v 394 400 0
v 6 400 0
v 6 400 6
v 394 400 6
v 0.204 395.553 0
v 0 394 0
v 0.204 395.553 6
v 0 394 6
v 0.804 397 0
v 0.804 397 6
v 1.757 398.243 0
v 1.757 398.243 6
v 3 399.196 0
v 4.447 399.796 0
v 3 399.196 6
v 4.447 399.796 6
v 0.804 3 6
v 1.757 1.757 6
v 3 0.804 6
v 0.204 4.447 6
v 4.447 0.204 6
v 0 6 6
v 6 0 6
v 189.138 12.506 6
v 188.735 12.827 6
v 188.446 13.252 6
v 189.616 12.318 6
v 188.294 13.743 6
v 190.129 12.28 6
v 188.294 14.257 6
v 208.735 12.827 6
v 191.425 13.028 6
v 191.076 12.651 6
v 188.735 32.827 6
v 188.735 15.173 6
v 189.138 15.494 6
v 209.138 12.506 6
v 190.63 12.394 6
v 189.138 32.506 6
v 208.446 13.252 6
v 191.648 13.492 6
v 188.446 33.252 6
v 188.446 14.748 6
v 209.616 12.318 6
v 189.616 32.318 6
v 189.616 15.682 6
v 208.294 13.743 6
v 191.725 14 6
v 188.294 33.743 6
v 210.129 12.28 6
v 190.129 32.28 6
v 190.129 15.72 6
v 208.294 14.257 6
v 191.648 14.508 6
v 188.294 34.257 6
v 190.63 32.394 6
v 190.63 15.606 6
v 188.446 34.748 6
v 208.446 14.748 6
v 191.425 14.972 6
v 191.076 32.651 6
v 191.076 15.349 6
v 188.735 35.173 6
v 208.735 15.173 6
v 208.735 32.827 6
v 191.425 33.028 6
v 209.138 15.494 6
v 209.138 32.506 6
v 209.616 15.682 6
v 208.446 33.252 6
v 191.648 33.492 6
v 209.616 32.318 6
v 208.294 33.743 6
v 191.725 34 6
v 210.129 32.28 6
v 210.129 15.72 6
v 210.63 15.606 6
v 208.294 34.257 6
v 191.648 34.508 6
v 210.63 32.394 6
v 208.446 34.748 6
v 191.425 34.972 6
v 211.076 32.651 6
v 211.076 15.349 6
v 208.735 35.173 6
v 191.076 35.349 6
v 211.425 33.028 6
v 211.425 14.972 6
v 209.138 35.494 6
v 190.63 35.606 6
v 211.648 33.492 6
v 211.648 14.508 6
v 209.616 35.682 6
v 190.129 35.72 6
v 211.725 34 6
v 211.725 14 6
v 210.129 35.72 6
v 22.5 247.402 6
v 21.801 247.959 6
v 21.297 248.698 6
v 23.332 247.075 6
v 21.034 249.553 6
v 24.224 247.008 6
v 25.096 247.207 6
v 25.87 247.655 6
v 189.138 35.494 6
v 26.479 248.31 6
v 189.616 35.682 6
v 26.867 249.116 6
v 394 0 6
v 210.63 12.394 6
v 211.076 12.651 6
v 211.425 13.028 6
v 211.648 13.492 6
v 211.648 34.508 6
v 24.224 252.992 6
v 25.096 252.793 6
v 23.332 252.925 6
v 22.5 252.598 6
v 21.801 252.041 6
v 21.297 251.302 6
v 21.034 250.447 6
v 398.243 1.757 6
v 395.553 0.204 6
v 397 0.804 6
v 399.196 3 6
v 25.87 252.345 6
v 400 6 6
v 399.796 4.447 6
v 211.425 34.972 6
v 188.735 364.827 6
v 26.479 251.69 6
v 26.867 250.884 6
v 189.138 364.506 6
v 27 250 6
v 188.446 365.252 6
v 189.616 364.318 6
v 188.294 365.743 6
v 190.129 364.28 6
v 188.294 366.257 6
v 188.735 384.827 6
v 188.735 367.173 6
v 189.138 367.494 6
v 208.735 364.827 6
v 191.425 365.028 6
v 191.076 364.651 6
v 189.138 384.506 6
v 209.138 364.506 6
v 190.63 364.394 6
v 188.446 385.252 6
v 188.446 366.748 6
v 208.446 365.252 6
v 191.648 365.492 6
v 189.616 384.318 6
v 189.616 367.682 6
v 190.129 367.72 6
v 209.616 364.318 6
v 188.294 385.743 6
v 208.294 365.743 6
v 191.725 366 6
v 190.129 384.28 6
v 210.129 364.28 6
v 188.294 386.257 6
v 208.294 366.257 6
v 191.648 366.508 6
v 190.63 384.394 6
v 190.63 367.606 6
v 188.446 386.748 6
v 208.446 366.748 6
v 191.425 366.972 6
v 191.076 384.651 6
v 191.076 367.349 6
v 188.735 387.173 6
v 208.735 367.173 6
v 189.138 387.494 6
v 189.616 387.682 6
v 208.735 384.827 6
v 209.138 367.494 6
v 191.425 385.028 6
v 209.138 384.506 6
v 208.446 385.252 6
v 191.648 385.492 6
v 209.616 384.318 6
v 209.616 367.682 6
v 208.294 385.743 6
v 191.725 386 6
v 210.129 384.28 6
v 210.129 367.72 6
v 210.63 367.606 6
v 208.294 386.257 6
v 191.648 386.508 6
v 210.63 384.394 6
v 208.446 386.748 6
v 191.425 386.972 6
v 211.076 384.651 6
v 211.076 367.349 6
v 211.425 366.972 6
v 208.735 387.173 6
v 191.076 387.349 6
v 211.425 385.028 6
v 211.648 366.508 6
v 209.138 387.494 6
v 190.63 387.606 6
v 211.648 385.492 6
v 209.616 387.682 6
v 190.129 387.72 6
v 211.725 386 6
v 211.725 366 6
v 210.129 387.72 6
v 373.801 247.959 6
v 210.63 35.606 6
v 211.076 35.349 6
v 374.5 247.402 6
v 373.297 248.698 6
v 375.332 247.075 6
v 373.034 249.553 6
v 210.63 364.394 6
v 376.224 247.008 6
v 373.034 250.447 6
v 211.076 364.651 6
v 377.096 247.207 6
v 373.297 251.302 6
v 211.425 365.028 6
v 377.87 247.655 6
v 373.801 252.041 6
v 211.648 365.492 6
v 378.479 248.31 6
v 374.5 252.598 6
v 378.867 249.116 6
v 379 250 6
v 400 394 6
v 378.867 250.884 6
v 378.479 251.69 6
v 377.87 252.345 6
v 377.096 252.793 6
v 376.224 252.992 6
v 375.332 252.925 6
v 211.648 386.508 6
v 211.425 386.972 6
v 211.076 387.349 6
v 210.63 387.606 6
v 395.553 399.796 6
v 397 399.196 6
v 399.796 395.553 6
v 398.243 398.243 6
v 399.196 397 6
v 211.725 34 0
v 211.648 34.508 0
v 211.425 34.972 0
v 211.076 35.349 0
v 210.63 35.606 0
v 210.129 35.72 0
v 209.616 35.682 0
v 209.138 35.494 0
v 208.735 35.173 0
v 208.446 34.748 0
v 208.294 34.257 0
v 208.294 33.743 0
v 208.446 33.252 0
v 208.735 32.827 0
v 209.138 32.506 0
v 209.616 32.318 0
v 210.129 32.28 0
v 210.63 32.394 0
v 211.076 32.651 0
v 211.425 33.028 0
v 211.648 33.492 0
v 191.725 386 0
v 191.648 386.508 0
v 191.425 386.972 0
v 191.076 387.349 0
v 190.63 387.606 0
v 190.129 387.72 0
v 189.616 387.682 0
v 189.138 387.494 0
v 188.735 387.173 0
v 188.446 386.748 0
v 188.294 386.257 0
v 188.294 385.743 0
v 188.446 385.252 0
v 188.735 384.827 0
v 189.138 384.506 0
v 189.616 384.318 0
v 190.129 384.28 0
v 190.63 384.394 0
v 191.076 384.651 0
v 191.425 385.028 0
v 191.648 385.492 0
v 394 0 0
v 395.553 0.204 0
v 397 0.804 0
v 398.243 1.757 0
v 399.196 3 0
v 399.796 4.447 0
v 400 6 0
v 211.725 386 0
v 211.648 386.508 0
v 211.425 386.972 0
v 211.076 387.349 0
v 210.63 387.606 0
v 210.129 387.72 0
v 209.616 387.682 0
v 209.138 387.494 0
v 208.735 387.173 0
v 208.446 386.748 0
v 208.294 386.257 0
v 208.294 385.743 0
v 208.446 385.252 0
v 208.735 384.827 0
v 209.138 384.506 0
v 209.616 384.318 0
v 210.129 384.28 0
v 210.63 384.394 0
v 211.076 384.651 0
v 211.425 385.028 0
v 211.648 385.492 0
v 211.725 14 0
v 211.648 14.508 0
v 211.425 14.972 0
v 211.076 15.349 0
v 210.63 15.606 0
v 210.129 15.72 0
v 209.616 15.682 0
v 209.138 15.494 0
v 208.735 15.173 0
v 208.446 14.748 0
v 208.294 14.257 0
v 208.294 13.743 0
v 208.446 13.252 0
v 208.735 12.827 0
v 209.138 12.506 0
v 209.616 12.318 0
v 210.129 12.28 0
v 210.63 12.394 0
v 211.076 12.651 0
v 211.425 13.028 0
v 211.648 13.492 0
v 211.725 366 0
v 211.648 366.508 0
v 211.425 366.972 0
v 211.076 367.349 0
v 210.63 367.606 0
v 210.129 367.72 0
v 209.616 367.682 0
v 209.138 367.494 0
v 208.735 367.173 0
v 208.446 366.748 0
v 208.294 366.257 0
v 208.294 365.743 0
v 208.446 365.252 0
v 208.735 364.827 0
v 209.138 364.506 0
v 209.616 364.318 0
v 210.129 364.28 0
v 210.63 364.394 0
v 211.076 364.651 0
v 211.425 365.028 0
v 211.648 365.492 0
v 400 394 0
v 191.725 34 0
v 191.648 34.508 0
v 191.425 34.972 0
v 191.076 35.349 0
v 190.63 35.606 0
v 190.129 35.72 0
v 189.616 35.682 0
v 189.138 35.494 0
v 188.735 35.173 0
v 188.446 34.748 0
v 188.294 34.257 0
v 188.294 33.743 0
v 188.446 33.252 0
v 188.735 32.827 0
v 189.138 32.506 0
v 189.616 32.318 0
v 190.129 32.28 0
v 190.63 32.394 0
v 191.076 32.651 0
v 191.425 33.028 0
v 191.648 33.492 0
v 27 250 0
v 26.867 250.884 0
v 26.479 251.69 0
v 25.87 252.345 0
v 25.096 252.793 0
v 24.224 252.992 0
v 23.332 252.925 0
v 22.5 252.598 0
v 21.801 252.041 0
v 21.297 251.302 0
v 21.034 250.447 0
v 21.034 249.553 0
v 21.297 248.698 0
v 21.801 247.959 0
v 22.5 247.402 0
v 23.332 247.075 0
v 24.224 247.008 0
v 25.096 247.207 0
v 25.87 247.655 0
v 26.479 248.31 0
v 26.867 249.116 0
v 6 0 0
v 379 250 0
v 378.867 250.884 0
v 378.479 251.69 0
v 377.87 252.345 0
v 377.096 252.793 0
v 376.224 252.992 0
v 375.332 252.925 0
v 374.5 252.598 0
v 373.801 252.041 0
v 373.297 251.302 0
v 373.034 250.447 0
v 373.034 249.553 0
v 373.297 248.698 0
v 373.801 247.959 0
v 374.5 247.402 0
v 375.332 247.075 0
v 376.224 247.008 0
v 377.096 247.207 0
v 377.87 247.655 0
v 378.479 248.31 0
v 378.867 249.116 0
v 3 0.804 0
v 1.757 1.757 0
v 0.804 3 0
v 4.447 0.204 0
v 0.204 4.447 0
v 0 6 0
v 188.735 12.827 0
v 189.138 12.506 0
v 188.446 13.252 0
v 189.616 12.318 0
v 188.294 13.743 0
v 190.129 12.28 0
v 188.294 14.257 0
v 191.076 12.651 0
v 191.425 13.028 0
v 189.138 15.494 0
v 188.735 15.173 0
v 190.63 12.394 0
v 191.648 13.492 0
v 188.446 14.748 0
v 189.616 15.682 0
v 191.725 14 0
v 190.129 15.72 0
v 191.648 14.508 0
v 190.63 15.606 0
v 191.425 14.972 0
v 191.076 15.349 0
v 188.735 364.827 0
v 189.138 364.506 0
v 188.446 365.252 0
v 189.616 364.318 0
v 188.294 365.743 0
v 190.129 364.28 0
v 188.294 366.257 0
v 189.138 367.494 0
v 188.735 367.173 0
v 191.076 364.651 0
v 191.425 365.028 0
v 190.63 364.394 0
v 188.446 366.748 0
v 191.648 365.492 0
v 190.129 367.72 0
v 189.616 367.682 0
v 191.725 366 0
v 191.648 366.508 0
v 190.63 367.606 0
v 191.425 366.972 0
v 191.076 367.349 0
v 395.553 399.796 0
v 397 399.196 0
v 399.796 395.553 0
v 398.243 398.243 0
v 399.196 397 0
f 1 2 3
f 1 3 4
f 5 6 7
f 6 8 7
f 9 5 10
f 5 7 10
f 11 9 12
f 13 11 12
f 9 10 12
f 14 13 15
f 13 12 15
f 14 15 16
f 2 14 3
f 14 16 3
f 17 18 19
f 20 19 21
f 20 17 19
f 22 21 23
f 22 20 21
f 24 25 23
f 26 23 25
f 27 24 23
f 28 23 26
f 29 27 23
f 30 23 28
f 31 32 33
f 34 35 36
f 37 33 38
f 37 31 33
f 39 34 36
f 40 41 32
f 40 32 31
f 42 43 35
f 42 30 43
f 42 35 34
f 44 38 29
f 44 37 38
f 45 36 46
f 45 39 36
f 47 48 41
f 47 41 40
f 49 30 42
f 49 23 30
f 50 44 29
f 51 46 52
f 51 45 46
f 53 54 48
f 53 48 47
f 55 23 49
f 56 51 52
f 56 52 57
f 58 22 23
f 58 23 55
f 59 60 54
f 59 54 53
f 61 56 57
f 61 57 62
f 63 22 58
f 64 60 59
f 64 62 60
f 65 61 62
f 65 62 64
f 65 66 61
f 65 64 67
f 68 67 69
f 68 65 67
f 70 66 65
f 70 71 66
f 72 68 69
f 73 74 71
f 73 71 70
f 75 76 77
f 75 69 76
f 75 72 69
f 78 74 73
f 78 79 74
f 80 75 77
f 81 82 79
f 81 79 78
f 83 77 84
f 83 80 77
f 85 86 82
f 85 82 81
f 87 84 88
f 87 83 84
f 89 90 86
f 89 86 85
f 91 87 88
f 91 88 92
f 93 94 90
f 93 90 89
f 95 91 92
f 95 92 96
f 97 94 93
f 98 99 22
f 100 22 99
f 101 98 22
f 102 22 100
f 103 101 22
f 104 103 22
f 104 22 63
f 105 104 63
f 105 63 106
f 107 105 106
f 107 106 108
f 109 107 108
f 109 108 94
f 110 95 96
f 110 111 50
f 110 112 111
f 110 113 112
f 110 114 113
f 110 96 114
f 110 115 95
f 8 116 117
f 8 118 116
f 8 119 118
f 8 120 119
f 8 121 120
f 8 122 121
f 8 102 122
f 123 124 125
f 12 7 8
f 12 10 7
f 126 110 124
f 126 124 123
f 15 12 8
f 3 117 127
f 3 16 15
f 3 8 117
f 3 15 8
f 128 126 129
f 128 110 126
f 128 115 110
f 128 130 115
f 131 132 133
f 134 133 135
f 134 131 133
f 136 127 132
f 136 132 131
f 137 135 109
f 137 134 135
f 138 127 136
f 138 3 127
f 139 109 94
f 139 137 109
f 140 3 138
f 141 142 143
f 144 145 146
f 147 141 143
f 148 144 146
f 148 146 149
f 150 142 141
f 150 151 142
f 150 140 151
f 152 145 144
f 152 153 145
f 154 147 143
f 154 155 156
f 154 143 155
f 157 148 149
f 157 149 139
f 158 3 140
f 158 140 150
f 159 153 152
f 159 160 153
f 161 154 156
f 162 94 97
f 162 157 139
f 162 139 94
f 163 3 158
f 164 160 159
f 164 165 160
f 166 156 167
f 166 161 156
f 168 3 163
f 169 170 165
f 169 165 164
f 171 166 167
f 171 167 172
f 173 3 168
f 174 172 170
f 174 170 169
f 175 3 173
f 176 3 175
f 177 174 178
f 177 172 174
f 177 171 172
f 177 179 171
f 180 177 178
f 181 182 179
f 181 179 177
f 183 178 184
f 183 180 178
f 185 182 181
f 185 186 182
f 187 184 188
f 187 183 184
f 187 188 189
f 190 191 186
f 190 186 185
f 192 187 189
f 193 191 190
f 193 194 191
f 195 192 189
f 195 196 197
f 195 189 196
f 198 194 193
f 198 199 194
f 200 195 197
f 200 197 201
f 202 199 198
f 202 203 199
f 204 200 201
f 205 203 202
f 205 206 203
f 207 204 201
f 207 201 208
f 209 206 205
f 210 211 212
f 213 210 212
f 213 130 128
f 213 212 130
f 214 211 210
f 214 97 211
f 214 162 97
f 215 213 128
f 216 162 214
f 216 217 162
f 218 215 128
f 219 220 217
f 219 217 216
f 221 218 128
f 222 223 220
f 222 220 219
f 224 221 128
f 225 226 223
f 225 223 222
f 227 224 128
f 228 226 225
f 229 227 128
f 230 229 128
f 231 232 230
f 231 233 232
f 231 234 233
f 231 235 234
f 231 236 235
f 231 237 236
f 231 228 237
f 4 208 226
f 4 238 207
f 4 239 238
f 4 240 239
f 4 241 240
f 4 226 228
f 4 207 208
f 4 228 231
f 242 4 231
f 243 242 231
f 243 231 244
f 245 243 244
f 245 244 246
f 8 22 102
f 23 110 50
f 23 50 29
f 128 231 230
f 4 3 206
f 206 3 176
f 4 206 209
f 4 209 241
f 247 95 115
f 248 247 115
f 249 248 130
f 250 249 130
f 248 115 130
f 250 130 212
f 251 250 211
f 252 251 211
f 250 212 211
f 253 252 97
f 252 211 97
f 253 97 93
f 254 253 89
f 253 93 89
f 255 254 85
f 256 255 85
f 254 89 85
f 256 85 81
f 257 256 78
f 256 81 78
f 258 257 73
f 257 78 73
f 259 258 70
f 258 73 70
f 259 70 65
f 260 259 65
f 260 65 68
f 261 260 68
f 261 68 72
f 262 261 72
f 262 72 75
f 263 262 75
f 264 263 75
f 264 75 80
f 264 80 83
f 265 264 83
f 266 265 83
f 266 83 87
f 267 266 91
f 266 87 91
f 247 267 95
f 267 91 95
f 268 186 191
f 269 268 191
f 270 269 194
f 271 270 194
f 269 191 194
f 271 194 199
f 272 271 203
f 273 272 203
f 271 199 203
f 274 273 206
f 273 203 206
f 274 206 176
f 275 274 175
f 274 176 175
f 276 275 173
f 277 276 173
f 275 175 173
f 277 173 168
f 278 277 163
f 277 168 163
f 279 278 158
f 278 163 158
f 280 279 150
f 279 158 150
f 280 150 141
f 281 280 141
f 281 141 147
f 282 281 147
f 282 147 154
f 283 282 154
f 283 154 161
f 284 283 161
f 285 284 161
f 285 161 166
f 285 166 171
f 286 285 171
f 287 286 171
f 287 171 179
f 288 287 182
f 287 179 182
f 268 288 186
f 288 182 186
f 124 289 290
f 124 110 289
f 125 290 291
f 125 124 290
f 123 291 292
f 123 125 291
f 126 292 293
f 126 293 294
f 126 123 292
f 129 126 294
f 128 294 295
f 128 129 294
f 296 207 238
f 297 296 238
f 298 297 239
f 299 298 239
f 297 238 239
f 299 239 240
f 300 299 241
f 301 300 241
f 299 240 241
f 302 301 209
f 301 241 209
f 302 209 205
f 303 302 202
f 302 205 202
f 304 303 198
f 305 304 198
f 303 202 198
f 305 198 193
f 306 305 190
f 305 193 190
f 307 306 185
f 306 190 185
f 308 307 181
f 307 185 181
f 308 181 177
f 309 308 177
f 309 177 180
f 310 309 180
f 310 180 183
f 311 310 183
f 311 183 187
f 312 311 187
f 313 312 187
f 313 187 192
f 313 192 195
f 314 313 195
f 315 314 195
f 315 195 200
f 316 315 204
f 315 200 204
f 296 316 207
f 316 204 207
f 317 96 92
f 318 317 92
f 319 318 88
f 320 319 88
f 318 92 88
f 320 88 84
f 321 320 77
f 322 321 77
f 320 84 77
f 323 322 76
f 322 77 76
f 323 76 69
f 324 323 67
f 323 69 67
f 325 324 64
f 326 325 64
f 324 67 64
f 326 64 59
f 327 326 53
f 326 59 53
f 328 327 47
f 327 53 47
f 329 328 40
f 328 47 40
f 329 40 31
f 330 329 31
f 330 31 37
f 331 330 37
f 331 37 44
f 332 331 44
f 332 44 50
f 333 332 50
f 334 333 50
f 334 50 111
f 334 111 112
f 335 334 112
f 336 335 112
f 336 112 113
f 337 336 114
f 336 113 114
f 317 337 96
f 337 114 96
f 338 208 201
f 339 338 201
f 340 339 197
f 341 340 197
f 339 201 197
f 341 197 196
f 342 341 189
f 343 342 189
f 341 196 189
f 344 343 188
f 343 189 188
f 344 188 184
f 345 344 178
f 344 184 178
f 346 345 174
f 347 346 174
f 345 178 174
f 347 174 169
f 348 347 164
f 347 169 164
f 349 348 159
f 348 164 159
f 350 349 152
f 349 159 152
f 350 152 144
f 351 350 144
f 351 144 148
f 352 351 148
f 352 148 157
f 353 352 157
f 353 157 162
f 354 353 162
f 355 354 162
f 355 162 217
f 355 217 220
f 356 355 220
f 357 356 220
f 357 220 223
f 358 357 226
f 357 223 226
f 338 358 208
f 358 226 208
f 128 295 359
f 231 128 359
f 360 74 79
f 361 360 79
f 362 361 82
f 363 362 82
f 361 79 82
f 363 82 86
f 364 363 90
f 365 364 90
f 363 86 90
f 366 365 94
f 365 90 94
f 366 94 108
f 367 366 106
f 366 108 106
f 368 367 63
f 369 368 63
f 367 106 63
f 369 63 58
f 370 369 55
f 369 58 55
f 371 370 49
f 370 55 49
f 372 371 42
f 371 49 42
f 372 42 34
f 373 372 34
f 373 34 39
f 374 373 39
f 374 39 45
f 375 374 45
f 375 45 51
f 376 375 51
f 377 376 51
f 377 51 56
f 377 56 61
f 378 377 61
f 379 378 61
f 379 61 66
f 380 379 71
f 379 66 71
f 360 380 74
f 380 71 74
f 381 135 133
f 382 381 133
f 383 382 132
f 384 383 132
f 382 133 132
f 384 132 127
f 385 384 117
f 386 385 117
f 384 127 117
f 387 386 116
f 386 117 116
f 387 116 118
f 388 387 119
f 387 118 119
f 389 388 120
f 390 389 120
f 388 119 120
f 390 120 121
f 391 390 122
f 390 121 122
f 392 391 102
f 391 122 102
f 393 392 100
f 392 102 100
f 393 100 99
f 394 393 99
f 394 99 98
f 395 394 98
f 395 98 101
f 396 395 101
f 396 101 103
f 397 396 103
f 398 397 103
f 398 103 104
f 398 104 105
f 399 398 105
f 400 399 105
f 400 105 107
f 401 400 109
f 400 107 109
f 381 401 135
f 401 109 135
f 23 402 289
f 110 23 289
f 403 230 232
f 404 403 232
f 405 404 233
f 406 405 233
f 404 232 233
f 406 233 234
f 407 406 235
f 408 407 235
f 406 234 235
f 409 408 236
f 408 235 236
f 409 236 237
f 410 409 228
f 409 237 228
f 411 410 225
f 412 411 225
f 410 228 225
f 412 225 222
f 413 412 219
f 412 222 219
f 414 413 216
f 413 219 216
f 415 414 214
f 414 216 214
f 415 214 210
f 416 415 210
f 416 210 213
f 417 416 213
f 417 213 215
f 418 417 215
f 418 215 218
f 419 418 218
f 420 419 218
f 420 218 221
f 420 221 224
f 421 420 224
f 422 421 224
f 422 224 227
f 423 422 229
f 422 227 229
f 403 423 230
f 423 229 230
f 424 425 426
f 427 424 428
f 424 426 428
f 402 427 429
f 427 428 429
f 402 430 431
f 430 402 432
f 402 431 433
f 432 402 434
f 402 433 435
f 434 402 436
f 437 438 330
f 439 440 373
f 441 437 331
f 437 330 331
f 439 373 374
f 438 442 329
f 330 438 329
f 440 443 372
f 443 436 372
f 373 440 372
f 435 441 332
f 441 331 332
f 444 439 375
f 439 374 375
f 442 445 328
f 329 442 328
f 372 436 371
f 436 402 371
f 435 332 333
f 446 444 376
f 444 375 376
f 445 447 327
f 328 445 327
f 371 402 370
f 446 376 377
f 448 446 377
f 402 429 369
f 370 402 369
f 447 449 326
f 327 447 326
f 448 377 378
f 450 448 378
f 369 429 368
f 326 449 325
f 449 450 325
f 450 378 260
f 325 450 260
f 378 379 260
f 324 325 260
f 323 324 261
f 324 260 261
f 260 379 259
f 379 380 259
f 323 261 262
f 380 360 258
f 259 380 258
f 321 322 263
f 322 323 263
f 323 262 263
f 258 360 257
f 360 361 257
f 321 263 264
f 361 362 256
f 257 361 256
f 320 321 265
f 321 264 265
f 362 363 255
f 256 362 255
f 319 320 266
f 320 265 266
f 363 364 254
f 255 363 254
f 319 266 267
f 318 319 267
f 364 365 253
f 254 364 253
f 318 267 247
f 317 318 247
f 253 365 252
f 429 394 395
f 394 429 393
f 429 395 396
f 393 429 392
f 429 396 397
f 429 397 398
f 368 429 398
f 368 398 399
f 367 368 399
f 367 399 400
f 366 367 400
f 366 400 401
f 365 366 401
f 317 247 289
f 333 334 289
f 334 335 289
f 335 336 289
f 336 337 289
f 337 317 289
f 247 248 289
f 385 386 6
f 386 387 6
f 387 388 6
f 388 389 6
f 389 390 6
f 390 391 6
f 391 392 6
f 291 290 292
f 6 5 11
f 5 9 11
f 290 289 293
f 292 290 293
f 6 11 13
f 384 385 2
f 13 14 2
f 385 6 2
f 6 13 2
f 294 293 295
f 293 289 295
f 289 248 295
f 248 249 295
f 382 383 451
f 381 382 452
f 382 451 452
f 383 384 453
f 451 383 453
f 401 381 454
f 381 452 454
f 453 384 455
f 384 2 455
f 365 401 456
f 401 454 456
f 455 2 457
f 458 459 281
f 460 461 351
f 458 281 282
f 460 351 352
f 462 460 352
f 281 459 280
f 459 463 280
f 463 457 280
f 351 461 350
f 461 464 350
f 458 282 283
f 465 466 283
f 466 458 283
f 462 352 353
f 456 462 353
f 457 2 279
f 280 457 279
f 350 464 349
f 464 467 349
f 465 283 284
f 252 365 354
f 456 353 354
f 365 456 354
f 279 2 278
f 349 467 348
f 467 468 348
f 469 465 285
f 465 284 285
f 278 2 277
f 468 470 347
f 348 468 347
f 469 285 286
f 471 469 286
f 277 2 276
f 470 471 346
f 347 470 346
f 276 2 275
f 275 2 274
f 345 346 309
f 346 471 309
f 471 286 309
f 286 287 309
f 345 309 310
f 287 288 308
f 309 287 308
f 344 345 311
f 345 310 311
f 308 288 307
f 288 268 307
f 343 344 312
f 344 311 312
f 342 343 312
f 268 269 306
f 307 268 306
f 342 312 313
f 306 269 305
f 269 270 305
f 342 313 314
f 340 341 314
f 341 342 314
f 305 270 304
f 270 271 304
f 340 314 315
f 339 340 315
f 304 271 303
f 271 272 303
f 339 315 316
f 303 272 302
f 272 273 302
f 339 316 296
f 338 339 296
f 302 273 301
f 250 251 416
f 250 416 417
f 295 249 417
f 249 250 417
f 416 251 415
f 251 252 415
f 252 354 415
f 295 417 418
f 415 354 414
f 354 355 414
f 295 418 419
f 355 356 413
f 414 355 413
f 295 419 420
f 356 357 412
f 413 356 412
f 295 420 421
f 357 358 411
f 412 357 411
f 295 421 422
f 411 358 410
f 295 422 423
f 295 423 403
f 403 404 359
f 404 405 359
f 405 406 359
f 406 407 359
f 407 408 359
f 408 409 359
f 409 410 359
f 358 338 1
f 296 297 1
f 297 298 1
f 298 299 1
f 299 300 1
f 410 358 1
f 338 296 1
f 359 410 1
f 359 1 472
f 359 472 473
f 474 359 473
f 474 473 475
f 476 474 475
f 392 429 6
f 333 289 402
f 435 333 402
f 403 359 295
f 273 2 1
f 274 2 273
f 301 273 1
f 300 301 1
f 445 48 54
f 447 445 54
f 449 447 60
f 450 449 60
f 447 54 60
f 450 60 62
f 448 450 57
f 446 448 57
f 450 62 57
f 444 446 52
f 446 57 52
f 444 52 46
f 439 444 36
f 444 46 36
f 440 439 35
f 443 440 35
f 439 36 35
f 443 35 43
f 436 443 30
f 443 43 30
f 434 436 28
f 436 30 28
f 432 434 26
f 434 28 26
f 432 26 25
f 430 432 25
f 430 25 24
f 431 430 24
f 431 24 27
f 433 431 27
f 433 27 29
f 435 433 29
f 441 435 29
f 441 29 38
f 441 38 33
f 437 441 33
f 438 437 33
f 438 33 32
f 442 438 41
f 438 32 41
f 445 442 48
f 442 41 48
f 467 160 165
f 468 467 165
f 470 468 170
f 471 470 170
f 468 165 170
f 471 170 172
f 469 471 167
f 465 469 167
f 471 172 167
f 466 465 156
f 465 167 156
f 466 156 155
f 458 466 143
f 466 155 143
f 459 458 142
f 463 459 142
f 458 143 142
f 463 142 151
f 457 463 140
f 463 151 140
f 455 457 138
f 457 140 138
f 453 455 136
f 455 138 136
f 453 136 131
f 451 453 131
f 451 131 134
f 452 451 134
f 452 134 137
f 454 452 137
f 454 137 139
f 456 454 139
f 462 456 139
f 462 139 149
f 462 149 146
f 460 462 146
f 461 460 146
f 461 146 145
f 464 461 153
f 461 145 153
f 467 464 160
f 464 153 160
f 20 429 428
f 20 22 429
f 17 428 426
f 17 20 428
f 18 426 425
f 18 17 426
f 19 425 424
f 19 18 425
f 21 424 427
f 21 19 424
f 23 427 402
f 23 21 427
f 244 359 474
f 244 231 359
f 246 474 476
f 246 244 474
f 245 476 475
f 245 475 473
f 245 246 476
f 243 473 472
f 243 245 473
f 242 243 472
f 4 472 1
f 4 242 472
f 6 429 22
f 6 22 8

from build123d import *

# Parameters (mm, degrees)
F0_W     = 400
F0_H     = 400
F1_DEPTH = 6
F2_R     = 6
F3_R     = 3
F3_R_2   = 1.725
F4_DEPTH = 6


with BuildPart() as f1:
    # F0 (on Top) → F1 (new body)
    with BuildSketch(Plane.XY):
        with Locations((200, 200)):
            Rectangle(F0_W, F0_H)
    extrude(amount=F1_DEPTH)

    # F2
    f2_edges = [f1.edges().sort_by_distance(p)[0] for p in [
        (0, 400, 3),
        (400, 400, 3),
        (400, 0, 3),
        (0, 0, 3),
    ]]
    fillet(f2_edges, radius=F2_R)

    # F3 (on face) → F4 (cut, through all)
    with BuildSketch(Plane.XY.offset(6)):
        with Locations((24, 250)):
            Circle(F3_R)
        with Locations((376, 250)):
            Circle(F3_R)
        with Locations((190, 386)):
            Circle(F3_R_2)
        with Locations((210, 386)):
            Circle(F3_R_2)
        with Locations((210, 366)):
            Circle(F3_R_2)
        with Locations((190, 366)):
            Circle(F3_R_2)
        with Locations((190, 34)):
            Circle(F3_R_2)
        with Locations((210, 34)):
            Circle(F3_R_2)
        with Locations((210, 14)):
            Circle(F3_R_2)
        with Locations((190, 14)):
            Circle(F3_R_2)
    extrude(amount=-F4_DEPTH, mode=Mode.SUBTRACT)


solid = f1.part
